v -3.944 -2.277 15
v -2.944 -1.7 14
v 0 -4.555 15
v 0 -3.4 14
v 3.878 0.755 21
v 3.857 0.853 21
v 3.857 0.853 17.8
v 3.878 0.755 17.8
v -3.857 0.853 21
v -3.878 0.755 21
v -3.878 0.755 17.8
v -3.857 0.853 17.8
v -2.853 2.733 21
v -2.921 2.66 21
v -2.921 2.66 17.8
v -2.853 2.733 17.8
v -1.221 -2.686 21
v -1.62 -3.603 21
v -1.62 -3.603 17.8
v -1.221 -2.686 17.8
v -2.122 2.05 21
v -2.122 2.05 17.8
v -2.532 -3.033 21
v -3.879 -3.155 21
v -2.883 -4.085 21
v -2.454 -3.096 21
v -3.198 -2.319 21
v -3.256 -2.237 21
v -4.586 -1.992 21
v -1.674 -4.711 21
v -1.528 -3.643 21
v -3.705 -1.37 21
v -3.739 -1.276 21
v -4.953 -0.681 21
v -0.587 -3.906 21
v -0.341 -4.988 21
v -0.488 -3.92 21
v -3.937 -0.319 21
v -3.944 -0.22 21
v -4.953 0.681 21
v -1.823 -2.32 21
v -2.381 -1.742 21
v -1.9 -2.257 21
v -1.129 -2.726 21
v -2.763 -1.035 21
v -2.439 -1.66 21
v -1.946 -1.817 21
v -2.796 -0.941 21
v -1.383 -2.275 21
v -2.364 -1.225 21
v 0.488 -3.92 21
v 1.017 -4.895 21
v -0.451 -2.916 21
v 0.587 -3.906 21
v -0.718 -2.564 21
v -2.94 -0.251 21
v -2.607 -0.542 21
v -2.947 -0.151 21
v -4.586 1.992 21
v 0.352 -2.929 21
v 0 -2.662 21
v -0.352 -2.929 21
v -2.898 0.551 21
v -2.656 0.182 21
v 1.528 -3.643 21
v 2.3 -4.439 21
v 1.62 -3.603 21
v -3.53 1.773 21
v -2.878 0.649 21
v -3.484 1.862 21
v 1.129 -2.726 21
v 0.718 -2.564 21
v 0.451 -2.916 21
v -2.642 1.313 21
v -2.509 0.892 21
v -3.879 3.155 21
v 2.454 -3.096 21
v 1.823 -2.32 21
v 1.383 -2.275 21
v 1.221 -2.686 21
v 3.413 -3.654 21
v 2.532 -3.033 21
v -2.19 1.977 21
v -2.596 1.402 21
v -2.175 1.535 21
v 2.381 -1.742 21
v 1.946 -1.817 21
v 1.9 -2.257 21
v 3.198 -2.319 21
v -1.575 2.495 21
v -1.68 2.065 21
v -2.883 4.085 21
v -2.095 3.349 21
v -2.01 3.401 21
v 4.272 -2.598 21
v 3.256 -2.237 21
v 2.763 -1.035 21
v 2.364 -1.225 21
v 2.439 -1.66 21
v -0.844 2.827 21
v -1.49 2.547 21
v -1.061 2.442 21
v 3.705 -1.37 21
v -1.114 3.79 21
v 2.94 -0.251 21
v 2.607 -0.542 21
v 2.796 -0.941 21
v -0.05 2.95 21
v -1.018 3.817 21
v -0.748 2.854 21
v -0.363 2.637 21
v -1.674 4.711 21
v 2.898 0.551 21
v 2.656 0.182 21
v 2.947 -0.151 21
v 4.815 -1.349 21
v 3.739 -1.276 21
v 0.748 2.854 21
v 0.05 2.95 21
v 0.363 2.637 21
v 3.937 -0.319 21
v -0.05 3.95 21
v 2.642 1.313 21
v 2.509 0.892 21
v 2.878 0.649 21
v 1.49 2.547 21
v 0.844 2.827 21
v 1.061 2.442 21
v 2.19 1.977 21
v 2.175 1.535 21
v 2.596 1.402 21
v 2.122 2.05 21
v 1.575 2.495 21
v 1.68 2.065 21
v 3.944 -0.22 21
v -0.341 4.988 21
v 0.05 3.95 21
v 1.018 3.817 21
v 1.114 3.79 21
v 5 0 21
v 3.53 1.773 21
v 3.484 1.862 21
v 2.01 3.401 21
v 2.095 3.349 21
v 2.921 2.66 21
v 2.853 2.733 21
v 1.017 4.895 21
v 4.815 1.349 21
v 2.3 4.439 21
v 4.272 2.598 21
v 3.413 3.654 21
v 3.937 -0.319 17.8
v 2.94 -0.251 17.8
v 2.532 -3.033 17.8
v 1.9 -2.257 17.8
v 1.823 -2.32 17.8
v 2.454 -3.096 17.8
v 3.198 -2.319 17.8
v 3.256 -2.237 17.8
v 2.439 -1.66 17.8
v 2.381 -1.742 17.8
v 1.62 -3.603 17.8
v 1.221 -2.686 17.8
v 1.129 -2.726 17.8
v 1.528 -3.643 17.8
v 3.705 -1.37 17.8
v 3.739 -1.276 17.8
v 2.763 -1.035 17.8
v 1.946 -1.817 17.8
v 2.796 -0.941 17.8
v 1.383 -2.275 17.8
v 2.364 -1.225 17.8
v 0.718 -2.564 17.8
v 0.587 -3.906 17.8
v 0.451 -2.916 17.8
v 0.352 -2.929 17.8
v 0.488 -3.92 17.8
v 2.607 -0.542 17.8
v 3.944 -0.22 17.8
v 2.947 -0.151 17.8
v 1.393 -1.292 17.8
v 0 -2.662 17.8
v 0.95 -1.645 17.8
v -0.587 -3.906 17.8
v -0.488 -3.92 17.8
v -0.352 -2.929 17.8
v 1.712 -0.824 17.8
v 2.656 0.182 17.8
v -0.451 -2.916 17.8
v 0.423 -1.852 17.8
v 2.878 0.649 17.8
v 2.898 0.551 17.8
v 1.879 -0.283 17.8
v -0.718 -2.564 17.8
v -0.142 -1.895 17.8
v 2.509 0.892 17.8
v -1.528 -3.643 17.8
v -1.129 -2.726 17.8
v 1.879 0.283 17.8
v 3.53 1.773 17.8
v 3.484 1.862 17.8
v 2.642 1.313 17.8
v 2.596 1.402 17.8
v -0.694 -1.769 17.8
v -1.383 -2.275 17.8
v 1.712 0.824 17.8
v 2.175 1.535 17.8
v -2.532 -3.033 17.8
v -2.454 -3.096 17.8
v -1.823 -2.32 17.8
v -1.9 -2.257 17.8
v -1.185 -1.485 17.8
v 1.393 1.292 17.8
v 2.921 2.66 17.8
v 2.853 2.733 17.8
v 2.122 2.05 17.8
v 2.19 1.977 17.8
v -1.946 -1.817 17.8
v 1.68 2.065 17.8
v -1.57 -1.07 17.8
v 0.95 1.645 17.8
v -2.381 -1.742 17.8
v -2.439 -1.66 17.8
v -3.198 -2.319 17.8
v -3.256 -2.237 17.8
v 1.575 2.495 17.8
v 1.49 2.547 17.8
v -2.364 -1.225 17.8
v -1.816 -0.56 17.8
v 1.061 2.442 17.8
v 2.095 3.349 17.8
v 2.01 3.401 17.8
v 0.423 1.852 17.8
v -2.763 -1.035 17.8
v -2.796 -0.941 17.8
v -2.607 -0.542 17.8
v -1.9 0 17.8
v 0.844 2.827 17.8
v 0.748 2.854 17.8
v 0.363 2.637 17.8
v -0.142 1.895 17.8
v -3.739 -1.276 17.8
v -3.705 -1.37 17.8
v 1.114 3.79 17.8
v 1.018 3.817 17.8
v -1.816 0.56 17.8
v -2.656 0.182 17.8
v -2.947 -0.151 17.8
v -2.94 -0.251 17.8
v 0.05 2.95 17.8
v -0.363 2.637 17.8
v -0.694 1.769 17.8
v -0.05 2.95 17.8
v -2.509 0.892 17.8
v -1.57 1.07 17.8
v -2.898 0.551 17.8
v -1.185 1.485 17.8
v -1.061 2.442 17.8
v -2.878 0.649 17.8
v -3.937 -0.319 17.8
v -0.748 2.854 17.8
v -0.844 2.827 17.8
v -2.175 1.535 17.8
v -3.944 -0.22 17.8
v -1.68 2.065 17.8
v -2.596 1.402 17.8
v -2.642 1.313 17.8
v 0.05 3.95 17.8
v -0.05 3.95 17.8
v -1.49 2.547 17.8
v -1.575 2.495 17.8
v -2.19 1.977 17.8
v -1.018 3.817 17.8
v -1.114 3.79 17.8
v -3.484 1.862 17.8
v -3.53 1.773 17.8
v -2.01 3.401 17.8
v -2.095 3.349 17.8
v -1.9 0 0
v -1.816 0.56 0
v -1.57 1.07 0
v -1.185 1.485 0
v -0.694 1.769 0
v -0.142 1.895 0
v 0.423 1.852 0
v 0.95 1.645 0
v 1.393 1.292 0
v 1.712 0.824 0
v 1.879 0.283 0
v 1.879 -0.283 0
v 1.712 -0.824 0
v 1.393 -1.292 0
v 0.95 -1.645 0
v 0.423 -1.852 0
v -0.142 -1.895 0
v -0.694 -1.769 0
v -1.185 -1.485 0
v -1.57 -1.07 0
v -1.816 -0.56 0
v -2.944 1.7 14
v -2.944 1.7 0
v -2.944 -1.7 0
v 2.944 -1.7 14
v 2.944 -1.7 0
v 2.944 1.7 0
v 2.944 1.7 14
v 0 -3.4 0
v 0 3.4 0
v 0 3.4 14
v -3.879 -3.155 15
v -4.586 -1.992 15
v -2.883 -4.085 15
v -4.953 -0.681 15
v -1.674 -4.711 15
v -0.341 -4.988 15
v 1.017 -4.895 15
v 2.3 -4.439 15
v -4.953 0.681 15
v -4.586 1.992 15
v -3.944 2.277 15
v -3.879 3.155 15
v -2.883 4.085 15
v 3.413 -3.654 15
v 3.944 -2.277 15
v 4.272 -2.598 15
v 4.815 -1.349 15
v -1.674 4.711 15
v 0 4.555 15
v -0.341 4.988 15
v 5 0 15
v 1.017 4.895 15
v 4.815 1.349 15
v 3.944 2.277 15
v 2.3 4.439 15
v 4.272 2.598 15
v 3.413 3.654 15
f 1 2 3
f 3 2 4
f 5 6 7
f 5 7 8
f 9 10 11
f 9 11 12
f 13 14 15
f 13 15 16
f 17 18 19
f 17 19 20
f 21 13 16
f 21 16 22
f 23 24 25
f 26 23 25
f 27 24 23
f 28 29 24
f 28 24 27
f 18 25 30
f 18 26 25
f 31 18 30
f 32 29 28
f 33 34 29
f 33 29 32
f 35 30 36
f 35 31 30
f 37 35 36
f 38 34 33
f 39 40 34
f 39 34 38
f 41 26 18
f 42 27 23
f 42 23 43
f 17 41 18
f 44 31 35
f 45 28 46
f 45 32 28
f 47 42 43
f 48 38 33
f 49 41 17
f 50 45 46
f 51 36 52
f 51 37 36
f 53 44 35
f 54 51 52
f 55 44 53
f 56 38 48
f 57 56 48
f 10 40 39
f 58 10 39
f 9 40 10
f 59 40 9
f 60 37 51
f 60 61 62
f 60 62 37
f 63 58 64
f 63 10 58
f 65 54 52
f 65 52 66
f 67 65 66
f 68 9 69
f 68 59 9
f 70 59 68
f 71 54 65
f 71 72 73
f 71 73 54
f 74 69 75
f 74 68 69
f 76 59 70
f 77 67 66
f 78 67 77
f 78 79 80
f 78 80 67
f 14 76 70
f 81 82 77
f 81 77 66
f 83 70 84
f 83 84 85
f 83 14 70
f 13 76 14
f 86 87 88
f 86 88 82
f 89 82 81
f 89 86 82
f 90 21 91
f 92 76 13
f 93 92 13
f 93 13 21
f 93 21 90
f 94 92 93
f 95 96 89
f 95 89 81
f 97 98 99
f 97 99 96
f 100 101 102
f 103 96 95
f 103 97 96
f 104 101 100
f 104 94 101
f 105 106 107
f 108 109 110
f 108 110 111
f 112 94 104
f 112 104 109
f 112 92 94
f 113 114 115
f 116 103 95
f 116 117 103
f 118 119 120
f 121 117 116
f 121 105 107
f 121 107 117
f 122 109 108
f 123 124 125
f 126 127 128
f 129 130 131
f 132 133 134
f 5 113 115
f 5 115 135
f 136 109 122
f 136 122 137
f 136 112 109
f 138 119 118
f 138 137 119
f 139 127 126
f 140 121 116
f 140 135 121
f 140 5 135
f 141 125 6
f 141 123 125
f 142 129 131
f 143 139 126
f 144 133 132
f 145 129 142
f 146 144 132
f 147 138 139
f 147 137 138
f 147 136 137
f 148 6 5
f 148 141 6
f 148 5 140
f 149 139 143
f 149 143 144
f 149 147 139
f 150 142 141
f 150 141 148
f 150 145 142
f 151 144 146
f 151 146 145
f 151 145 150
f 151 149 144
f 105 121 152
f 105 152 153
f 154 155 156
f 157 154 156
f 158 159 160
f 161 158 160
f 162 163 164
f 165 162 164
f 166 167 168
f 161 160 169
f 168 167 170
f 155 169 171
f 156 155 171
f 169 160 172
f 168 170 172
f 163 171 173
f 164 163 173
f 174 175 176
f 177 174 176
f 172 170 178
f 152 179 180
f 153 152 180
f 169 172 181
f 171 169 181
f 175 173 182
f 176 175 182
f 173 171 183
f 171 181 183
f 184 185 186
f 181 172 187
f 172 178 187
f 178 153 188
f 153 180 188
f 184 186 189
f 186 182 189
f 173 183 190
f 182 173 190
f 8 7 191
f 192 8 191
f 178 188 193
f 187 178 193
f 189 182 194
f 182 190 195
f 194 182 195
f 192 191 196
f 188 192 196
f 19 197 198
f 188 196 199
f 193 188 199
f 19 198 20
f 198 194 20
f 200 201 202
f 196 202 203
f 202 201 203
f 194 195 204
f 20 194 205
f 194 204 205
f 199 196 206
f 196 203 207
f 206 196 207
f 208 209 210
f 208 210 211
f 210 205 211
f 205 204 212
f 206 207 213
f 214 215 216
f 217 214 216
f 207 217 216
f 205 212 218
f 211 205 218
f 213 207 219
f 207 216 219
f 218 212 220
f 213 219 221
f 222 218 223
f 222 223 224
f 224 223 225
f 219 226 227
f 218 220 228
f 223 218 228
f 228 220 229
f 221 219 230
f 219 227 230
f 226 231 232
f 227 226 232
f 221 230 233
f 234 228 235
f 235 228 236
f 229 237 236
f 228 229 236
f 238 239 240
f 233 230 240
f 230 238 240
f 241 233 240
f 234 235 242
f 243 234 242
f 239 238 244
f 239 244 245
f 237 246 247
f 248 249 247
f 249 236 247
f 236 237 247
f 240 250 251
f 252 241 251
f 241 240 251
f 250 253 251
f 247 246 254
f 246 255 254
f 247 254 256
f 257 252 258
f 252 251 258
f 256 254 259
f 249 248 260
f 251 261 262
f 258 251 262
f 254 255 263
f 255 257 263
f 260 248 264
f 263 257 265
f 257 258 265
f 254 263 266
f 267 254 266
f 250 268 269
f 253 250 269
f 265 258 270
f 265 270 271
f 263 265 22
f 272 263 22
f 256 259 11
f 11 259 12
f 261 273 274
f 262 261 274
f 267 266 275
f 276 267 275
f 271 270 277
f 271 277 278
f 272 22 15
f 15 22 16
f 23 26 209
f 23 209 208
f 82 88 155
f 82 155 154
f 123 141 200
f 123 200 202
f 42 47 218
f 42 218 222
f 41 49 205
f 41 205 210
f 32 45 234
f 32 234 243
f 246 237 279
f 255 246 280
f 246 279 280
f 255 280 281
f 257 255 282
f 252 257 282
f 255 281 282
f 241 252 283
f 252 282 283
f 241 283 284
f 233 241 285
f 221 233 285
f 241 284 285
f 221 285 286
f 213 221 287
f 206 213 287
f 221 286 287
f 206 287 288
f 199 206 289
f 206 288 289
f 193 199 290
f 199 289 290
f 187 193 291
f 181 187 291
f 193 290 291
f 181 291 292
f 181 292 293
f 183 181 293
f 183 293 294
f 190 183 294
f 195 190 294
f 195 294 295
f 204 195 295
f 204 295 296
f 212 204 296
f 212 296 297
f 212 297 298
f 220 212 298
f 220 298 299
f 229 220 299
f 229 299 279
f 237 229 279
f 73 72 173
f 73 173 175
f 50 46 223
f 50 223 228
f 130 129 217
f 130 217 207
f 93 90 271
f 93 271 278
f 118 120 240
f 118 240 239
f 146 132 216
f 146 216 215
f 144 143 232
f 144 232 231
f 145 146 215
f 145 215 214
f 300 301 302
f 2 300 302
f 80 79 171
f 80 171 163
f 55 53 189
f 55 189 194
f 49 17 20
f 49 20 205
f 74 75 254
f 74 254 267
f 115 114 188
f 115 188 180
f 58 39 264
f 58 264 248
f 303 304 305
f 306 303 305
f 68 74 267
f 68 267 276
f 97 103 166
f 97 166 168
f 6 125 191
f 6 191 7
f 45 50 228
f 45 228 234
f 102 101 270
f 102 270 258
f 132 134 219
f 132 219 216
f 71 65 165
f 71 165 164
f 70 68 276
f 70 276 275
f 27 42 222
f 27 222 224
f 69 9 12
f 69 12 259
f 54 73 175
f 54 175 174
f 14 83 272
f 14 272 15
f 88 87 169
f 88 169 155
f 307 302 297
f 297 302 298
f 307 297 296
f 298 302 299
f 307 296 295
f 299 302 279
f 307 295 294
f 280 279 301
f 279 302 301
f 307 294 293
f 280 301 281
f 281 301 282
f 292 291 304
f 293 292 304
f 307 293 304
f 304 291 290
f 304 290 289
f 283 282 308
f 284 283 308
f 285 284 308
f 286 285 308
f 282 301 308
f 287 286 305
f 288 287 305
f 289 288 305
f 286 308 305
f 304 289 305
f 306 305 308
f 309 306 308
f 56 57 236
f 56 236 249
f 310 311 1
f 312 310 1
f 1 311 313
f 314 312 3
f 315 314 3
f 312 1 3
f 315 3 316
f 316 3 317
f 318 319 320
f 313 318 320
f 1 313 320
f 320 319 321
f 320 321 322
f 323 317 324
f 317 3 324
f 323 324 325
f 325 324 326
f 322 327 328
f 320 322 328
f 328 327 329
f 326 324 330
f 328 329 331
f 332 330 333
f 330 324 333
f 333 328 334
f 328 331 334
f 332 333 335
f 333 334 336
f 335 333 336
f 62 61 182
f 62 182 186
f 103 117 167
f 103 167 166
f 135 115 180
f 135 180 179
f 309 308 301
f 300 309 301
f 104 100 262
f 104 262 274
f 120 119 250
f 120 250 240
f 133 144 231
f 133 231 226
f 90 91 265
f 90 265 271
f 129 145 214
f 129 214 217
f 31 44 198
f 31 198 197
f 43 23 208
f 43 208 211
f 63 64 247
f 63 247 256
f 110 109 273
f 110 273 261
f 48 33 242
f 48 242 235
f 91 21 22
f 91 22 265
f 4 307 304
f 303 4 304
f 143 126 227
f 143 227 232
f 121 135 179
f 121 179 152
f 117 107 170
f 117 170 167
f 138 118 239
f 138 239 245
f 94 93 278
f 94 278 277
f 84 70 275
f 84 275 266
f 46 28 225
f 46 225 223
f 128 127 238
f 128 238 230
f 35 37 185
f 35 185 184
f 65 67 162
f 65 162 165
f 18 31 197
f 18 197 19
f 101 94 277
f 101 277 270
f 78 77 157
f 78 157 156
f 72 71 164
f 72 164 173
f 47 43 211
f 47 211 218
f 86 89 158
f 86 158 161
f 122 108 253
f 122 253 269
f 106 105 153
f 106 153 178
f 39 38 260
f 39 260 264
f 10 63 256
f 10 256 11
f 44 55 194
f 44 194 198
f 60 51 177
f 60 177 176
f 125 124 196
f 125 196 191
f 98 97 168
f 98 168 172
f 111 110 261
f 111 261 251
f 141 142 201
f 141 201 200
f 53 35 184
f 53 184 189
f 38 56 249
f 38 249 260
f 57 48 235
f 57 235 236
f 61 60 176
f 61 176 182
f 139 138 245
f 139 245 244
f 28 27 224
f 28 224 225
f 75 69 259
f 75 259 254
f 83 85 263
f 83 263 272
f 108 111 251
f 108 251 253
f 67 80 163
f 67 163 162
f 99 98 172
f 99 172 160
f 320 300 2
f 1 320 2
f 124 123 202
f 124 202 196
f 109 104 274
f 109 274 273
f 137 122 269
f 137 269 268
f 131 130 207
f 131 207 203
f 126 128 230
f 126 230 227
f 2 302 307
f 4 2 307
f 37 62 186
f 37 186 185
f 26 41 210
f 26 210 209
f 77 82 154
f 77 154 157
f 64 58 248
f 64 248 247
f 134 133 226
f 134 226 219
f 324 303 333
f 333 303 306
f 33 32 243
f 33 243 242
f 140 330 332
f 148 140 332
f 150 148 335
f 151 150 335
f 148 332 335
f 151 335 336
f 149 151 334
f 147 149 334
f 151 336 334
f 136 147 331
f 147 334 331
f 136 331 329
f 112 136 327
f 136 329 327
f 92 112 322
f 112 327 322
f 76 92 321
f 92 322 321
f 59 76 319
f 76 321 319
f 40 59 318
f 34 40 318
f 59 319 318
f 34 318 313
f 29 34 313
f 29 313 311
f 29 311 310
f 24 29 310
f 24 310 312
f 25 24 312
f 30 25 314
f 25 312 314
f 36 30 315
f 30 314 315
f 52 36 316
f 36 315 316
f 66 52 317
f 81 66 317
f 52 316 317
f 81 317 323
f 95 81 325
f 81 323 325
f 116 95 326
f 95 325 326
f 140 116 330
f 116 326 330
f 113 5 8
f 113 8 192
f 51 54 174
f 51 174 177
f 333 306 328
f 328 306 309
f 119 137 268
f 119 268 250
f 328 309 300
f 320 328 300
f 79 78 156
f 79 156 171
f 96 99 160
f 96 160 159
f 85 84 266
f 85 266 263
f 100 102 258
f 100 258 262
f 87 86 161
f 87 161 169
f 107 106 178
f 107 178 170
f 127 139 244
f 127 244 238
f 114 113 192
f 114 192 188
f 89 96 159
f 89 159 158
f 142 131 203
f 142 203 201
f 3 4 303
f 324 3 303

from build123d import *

# Parameters (mm, degrees)
EXTRUDE_1_DEPTH     = 15
SKETCH_6_R          = 5
EXTRUDE_3_DEPTH     = 6
CUT_EXTRUDE_5_DEPTH = 3.2
CHAMFER_1_SIZE      = 1
SKETCH_7_R          = 1.9
CUT_EXTRUDE_6_DEPTH = 23.158519806


with BuildPart() as part:
    # ｽｹｯﾁ1 → ﾎﾞｽ - 押し出し1 (new body)
    with BuildSketch(Plane.XY):
        Polygon((0, 3.4), (-2.944486373, 1.7), (-2.944486373, -1.7), (0, -3.4), (2.944486373, -1.7), (2.944486373, 1.7), align=None)
    extrude(amount=EXTRUDE_1_DEPTH)

    # ｽｹｯﾁ6 → ﾎﾞｽ - 押し出し3 (add)
    with BuildSketch(Plane.XY.offset(15)):
        Circle(SKETCH_6_R)
    extrude(amount=EXTRUDE_3_DEPTH)

    # ｽｹｯﾁ5 → ｶｯﾄ - 押し出し5 (cut)
    with BuildSketch(Plane.XY.offset(21)):
        Polygon((-0.05, 2.95), (-0.05, 3.95), (0.05, 3.95), (0.05, 2.95), (0.362514094, 2.637485906), (0.747754611, 2.854095836), (1.017551382, 3.817013124), (1.11384311, 3.790033446), (0.844046339, 2.827116159), (1.060656269, 2.441875642), (1.490051682, 2.546516441), (2.009635632, 3.400935845), (2.095077573, 3.34897745), (1.575493623, 2.494558046), (1.680134421, 2.065162633), (2.121838437, 2.050073571), (2.852674402, 2.732626714), (2.920929716, 2.659543117), (2.190093752, 1.976989974), (2.17500469, 1.535285958), (2.596258142, 1.401586122), (3.484143361, 1.86165116), (3.530149865, 1.772862638), (2.642264646, 1.3127976), (2.50856481, 0.891544148), (2.878125258, 0.649149443), (3.857209346, 0.852605456), (3.877554947, 0.754697047), (2.898470859, 0.551241034), (2.656076155, 0.181680586), (2.94653499, -0.151431681), (3.944203759, -0.219674094), (3.937379518, -0.319440971), (2.939710748, -0.251198558), (2.606598481, -0.541657393), (2.796413701, -0.94078181), (3.738674623, -1.275661422), (3.705186662, -1.369887514), (2.76292574, -1.035007902), (2.363801323, -1.224823122), (2.4388952, -1.660358456), (3.255865093, -2.237038778), (3.198197061, -2.318735767), (2.381227168, -1.742055445), (1.945691834, -1.817149322), (1.900495, -2.25679391), (2.531582945, -3.032505201), (2.454011816, -3.095613995), (1.822923871, -2.319902705), (1.383279283, -2.274705871), (1.22114378, -2.685853285), (1.61954487, -3.603064586), (1.52782374, -3.642904695), (1.12942265, -2.725693394), (0.718275236, -2.563557891), (0.451225912, -2.915715208), (0.587392561, -3.906401154), (0.488323967, -3.920017819), (0.352157318, -2.929331873), (0, -2.66228255), (-0.352157318, -2.929331873), (-0.488323967, -3.920017819), (-0.587392561, -3.906401154), (-0.451225912, -2.915715208), (-0.718275236, -2.563557891), (-1.12942265, -2.725693394), (-1.52782374, -3.642904695), (-1.61954487, -3.603064586), (-1.22114378, -2.685853285), (-1.383279283, -2.274705871), (-1.822923871, -2.319902705), (-2.454011816, -3.095613995), (-2.531582945, -3.032505201), (-1.900495, -2.25679391), (-1.945691834, -1.817149322), (-2.381227168, -1.742055445), (-3.198197061, -2.318735767), (-3.255865093, -2.237038778), (-2.4388952, -1.660358456), (-2.363801323, -1.224823122), (-2.76292574, -1.035007902), (-3.705186662, -1.369887514), (-3.738674623, -1.275661422), (-2.796413701, -0.94078181), (-2.606598481, -0.541657393), (-2.939710748, -0.251198558), (-3.937379518, -0.319440971), (-3.944203759, -0.219674094), (-2.94653499, -0.151431681), (-2.656076155, 0.181680586), (-2.898470859, 0.551241034), (-3.877554947, 0.754697047), (-3.857209346, 0.852605456), (-2.878125258, 0.649149443), (-2.50856481, 0.891544148), (-2.642264646, 1.3127976), (-3.530149865, 1.772862638), (-3.484143361, 1.86165116), (-2.596258142, 1.401586122), (-2.17500469, 1.535285958), (-2.190093752, 1.976989974), (-2.920929716, 2.659543117), (-2.852674402, 2.732626714), (-2.121838437, 2.050073571), (-1.680134421, 2.065162633), (-1.575493623, 2.494558046), (-2.095077573, 3.34897745), (-2.009635632, 3.400935845), (-1.490051682, 2.546516441), (-1.060656269, 2.441875642), (-0.844046339, 2.827116159), (-1.11384311, 3.790033446), (-1.017551382, 3.817013124), (-0.747754611, 2.854095836), (-0.362514094, 2.637485906), align=None)
    extrude(amount=-CUT_EXTRUDE_5_DEPTH, mode=Mode.SUBTRACT)

    # 面取り1
    chamfer_1_edges = [part.edges().sort_by_distance(p)[0] for p in [
        (-2.944486373, 0, 15),
        (-1.472243186, -2.55, 15),
        (1.472243186, -2.55, 15),
        (2.944486373, 0, 15),
        (1.472243186, 2.55, 15),
        (-1.472243186, 2.55, 15),
    ]]
    chamfer(chamfer_1_edges, length=CHAMFER_1_SIZE)

    # ｽｹｯﾁ7 → ｶｯﾄ - 押し出し6 (cut, through all)
    with BuildSketch(Plane(origin=(0, 0, 0), x_dir=(-1, 0, 0), z_dir=(0, 0, -1))):
        Circle(SKETCH_7_R)
    extrude(amount=-CUT_EXTRUDE_6_DEPTH, mode=Mode.SUBTRACT)


solid = part.part
